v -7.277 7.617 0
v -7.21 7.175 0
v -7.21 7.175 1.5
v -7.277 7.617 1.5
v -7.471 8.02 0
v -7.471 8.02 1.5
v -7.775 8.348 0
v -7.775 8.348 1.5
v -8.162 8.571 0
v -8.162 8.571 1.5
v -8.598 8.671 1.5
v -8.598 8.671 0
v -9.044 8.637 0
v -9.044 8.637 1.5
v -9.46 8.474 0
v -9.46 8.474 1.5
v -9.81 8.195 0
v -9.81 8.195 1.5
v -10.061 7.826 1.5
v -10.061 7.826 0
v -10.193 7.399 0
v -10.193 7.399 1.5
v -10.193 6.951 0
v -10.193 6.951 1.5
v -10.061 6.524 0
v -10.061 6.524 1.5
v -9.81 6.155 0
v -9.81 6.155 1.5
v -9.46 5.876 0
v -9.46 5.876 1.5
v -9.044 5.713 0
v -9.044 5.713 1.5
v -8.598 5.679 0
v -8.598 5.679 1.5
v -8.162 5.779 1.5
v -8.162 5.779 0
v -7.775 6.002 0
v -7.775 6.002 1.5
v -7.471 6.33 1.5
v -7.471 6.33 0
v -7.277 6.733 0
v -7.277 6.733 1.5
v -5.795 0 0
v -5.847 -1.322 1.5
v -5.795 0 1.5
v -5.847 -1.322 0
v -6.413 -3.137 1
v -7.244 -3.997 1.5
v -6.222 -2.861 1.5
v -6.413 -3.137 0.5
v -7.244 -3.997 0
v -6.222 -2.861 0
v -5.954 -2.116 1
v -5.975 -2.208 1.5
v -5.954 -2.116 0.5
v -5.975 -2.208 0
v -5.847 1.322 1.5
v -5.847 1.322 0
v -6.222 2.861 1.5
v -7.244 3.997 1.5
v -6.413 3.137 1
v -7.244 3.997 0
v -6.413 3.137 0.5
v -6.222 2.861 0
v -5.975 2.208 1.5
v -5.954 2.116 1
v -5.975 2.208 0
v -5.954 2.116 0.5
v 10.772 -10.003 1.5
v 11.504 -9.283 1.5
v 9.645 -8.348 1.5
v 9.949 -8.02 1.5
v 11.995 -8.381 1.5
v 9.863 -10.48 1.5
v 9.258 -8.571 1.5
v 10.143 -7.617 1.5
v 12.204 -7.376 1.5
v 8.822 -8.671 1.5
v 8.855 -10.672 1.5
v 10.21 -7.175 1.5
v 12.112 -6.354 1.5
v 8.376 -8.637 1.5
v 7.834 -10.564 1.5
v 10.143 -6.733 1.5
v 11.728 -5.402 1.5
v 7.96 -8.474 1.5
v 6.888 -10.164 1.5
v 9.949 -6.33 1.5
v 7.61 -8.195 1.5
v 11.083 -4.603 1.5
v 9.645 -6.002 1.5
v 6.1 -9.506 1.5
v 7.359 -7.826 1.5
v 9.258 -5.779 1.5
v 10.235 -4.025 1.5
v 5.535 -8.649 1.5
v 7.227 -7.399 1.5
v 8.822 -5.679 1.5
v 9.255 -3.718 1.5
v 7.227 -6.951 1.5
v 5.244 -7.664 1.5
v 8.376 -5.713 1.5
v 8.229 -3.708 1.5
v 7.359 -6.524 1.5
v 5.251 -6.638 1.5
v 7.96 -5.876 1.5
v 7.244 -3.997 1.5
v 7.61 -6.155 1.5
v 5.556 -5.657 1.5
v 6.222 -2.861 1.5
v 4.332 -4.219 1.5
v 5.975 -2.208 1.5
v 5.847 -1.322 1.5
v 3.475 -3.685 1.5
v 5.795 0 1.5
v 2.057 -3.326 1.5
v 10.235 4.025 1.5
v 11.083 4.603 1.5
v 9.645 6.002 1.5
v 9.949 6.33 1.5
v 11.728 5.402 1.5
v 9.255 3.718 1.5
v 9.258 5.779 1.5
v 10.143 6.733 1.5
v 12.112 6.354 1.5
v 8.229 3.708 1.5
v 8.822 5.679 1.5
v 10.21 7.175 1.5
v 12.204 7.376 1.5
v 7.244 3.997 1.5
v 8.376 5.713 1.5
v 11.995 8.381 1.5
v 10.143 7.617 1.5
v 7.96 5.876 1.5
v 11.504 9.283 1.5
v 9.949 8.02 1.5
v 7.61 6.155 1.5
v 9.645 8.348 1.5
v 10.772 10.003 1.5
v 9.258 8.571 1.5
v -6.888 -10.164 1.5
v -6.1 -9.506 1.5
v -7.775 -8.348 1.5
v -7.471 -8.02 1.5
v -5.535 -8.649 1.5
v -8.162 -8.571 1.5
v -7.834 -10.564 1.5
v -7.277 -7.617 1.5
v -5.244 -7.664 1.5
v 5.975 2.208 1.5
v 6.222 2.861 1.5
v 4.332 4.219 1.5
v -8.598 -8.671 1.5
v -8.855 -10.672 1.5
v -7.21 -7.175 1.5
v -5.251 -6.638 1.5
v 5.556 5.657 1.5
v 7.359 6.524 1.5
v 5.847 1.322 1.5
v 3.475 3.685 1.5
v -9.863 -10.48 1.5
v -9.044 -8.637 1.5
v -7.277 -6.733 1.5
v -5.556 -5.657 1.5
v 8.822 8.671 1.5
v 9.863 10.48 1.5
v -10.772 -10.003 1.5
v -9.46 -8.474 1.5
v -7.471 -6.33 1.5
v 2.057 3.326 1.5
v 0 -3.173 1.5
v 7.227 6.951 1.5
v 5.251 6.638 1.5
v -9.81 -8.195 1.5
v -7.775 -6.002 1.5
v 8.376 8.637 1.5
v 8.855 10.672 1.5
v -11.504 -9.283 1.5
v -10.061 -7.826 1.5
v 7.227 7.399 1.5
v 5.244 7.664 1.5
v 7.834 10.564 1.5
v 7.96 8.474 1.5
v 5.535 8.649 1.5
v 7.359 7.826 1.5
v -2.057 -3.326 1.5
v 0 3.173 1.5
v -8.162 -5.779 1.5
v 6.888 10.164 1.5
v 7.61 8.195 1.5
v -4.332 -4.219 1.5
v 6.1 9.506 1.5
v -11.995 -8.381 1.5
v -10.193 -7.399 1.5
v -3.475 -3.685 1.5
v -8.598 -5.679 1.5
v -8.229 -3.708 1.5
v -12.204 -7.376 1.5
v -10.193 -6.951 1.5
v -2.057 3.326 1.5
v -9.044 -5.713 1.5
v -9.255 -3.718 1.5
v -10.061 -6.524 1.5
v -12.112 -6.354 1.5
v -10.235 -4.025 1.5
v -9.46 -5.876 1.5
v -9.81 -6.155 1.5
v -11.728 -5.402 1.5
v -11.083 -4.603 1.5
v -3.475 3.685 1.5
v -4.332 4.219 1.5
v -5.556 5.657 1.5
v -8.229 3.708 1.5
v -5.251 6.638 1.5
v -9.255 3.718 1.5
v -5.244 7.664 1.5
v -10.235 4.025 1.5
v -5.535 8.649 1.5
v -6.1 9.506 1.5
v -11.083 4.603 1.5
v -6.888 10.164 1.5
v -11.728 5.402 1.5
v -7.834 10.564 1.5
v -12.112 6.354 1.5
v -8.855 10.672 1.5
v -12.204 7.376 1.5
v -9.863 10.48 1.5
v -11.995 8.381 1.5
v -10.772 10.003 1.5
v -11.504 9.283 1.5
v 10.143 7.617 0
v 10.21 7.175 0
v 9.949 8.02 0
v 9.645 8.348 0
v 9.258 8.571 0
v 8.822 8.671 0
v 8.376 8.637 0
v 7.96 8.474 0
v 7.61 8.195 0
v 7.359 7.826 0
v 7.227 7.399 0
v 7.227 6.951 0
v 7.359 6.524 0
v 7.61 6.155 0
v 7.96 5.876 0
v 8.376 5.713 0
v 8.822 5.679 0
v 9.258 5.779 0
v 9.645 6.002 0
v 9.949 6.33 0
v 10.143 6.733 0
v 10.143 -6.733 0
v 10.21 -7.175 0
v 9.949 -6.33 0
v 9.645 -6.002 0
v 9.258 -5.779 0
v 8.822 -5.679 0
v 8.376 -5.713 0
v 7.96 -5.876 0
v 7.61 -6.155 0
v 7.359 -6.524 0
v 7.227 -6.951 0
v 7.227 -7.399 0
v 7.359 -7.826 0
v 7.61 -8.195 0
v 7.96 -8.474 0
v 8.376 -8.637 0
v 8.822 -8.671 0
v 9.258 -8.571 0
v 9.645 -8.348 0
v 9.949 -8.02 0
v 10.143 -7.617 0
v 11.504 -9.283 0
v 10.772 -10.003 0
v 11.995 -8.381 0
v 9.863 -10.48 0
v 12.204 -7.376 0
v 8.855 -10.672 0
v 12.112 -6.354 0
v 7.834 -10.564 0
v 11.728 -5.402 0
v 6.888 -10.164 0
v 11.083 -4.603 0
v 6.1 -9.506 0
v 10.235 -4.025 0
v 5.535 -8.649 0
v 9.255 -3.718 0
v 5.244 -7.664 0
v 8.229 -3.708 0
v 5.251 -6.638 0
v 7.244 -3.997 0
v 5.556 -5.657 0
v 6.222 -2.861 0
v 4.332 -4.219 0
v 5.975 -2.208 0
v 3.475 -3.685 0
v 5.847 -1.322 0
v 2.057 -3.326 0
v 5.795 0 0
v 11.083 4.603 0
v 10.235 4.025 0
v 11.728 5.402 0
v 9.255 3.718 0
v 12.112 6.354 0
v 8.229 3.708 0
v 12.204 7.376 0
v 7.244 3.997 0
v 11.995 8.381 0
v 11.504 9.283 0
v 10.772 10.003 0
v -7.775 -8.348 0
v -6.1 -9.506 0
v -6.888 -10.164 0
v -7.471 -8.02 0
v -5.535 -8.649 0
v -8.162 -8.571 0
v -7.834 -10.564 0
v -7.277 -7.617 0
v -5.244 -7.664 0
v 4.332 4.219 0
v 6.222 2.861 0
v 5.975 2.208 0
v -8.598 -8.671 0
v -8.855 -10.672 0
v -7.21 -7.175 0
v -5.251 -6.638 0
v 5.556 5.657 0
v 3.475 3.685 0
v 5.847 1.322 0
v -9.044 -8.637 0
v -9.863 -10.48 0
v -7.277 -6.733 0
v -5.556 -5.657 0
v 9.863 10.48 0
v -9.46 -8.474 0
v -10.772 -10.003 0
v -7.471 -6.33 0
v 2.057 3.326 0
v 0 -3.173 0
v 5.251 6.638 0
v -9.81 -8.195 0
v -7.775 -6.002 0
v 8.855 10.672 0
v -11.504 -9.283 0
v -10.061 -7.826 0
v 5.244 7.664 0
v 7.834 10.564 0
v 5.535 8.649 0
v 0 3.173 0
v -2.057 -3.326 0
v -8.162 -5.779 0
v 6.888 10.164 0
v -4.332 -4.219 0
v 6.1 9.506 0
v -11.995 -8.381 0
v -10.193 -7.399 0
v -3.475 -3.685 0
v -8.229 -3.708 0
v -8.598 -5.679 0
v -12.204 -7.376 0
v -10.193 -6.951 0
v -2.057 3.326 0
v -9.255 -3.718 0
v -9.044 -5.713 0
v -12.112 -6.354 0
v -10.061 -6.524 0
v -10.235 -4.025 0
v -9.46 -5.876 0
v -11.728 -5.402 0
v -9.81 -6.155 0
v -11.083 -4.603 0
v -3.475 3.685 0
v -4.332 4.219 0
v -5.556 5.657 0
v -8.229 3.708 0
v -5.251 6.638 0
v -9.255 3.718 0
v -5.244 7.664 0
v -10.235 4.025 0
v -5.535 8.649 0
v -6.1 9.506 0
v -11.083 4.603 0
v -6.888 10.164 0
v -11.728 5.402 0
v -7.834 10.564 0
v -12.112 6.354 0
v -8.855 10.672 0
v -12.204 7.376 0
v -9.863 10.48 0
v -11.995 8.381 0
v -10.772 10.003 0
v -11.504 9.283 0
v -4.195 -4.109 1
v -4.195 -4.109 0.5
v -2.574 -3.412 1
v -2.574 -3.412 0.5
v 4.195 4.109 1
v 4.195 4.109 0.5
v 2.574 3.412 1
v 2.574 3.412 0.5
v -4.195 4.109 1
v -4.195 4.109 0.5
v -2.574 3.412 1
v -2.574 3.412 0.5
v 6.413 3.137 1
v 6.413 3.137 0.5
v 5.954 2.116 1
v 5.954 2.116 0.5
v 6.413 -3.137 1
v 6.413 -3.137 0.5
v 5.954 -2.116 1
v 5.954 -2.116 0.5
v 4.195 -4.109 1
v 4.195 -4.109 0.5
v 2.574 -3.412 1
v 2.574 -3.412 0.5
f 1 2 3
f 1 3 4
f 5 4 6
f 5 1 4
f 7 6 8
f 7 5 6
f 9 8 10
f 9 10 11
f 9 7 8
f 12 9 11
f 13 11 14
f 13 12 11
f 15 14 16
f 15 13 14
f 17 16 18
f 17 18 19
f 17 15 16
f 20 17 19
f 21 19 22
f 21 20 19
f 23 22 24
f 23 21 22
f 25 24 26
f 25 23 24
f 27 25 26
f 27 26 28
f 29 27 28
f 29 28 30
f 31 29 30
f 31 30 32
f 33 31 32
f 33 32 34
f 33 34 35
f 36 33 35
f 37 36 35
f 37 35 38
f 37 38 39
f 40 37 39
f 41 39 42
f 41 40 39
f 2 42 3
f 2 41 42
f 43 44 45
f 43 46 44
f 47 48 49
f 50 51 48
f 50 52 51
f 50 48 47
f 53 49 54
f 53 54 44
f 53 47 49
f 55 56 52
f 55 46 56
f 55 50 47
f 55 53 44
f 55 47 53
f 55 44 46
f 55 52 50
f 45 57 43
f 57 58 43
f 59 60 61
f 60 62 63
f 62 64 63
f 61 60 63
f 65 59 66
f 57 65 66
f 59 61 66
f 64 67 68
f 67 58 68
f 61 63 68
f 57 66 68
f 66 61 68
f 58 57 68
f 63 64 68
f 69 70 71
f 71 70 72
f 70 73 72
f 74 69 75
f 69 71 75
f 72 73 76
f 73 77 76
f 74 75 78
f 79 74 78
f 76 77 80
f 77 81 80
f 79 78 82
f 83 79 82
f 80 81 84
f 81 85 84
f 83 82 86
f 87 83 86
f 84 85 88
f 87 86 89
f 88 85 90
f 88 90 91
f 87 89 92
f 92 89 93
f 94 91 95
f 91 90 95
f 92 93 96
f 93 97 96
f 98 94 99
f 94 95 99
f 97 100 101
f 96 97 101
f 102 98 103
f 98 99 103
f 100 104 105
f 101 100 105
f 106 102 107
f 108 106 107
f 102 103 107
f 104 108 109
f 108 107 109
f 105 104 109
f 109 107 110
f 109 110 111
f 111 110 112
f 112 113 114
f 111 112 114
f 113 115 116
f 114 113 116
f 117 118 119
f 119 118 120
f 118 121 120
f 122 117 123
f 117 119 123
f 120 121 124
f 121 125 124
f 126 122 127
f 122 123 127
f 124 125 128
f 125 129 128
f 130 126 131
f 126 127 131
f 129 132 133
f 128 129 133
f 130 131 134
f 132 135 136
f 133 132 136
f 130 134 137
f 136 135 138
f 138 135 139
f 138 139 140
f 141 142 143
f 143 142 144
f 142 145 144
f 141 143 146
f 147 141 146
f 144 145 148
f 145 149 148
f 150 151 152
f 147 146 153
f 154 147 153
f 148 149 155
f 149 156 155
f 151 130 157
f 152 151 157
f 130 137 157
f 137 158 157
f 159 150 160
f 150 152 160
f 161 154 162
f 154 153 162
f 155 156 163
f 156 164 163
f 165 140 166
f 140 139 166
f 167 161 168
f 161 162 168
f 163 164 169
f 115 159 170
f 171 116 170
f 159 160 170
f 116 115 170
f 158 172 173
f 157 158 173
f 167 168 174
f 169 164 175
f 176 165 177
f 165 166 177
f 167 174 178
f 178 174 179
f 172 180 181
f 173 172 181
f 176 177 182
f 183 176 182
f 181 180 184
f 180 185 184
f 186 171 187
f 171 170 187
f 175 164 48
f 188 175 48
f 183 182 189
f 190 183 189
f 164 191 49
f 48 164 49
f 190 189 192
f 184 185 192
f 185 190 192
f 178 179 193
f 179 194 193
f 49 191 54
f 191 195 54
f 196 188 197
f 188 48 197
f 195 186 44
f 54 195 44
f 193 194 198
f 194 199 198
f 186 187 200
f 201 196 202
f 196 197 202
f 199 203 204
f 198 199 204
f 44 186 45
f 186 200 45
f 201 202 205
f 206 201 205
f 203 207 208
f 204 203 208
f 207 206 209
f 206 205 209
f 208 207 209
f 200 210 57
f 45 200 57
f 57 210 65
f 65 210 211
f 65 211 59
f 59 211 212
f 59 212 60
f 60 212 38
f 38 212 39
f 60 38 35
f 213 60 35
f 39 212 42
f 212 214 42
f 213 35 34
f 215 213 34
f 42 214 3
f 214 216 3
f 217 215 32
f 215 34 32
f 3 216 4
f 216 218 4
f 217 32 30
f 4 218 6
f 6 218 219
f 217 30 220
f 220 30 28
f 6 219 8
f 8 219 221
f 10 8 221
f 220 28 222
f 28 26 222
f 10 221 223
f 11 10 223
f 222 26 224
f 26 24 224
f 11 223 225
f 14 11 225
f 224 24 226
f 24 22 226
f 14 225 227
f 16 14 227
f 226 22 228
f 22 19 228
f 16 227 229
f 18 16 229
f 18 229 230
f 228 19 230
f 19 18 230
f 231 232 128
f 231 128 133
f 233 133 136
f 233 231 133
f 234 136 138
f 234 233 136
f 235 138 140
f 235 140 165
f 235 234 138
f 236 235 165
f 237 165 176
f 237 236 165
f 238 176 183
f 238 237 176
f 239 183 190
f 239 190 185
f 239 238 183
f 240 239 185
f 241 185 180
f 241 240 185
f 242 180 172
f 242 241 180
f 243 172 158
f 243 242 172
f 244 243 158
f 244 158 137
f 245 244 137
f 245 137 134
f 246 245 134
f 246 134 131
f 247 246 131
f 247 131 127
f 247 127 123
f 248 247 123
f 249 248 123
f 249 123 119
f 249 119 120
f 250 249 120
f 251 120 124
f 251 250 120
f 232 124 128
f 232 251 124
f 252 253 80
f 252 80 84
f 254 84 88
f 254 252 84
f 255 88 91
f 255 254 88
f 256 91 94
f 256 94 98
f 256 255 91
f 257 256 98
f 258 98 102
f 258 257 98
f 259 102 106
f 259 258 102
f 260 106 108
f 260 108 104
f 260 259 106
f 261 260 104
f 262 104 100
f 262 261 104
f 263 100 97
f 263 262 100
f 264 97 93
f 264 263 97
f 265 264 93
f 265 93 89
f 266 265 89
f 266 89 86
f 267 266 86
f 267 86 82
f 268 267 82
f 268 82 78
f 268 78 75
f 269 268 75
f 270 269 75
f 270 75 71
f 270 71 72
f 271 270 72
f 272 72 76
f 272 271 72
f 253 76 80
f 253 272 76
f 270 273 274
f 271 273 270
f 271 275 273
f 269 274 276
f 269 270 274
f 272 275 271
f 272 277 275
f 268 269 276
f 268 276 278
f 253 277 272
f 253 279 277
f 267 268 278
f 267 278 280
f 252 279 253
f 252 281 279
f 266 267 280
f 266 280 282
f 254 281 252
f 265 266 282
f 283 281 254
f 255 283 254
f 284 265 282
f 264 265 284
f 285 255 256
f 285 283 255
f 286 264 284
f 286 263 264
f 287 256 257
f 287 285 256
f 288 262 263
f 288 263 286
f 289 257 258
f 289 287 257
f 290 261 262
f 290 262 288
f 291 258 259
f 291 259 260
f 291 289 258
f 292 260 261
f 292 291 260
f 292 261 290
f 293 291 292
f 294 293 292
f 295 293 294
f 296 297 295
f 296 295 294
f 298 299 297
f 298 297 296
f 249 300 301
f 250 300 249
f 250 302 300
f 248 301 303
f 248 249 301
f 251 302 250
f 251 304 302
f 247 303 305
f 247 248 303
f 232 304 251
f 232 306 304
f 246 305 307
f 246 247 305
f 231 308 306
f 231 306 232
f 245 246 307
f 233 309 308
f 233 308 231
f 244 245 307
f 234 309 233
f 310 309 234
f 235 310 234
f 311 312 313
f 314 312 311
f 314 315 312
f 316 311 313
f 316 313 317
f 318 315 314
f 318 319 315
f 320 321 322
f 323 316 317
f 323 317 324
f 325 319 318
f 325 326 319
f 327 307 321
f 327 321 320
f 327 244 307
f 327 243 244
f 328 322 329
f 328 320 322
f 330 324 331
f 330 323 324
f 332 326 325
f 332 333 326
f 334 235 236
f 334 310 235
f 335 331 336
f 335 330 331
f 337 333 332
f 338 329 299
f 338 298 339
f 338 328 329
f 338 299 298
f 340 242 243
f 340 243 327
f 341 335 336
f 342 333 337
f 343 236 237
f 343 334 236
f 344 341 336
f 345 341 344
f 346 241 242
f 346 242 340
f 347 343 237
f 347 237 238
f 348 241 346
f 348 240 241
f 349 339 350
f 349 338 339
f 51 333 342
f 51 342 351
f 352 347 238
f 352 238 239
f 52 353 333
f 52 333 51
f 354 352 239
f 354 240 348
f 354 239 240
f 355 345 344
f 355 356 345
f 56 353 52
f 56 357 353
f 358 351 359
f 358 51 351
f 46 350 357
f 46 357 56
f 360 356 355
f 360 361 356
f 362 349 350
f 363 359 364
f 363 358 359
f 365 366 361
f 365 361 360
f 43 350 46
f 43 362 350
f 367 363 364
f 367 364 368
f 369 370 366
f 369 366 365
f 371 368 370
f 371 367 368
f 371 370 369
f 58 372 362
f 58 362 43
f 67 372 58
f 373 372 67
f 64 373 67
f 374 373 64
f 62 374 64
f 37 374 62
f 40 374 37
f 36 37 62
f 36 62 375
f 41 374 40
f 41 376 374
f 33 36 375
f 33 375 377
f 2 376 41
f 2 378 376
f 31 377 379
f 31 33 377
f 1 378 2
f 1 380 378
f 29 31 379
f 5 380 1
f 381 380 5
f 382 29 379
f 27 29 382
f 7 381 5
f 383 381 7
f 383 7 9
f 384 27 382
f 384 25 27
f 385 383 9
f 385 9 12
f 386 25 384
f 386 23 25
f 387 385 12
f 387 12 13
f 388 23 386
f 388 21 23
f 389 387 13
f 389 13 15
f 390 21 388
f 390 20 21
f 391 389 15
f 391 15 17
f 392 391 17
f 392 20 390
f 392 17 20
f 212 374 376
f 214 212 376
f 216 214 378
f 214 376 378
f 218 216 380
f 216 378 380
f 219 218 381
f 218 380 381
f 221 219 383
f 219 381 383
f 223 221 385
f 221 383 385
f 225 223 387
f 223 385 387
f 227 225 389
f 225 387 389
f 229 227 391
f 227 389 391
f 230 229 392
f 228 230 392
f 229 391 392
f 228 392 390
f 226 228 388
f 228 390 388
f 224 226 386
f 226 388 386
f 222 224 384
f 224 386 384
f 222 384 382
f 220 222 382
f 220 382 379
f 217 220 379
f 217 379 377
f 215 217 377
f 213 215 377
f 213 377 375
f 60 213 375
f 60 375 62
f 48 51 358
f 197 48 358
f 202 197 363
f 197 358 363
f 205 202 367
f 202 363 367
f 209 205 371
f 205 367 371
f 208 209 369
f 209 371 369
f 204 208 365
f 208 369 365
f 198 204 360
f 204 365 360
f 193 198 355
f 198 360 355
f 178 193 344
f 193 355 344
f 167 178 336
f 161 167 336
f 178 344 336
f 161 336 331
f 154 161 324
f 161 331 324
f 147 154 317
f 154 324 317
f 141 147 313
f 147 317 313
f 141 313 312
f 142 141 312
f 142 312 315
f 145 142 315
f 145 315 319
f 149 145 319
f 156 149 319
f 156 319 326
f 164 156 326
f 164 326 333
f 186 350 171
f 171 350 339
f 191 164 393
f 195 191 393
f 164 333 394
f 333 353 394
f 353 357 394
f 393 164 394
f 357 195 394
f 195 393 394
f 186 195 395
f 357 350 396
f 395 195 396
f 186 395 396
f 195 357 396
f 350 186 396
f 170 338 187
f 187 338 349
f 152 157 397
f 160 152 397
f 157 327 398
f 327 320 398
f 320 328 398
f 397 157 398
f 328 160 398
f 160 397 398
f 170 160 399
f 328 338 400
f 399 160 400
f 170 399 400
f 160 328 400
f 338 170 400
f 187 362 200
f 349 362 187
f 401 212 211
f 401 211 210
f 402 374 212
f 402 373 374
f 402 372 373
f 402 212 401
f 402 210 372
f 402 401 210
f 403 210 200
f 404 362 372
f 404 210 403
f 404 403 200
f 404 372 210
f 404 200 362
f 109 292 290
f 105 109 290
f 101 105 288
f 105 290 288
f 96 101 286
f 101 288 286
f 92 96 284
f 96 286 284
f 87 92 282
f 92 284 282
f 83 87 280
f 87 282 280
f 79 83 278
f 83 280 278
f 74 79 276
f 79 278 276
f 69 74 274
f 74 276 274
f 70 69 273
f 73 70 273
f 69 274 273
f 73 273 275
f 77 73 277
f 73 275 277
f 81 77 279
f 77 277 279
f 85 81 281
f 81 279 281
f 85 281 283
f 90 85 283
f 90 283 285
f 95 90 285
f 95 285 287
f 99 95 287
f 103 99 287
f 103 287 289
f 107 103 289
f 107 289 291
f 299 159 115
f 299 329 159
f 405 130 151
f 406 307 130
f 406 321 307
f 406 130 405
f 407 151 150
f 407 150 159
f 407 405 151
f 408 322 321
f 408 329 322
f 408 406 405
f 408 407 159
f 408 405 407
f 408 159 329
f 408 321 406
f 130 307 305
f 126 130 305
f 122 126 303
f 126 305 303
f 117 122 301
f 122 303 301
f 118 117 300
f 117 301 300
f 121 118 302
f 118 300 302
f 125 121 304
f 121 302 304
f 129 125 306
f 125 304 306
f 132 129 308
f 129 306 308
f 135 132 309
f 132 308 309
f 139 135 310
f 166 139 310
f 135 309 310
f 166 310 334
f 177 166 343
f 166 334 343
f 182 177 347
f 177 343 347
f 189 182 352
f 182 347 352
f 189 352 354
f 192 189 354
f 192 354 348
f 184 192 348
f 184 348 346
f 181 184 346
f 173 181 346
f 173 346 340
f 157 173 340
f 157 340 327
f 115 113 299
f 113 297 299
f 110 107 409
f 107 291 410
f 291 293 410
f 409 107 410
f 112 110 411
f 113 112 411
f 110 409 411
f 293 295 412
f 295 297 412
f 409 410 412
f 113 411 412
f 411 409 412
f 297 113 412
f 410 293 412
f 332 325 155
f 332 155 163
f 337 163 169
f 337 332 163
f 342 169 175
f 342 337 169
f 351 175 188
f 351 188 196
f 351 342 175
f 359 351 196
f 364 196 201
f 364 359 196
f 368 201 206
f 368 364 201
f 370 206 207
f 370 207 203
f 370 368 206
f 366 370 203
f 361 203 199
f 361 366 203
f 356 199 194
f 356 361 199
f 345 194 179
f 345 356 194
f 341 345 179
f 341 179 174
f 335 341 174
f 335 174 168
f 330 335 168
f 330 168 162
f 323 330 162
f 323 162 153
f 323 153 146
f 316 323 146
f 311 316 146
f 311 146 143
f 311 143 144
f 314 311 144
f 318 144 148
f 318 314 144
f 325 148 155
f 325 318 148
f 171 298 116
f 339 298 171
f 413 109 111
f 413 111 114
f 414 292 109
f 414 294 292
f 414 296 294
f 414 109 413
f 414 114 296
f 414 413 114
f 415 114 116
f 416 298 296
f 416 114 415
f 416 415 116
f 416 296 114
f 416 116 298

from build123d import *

# Parameters (mm, degrees)
F0_R     = 1.5
F1_DEPTH = 1.5


with BuildPart() as f1:
    # F0 (on Top) → F1 (new body)
    with BuildSketch(Plane.XY):
        with BuildLine():
            add(Edge.make_bspline(
                [(-5.5561550838, 5.6573497621), (-4.0955413133, 3.5522743128), (-3.2797986642, 3.3143495675), (0, 3.173440462)],
                knots=[0, 0, 0, 0, 6.0861042323, 6.0861042323, 6.0861042323, 6.0861042323], degree=3))
            ThreePointArc((-5.5561550838, 5.6573497621), (-11.1647533144, 9.6698318912), (-7.2436210565, 3.9969923231))
            add(Edge.make_bspline(
                [(-7.2436210565, 3.9969923231), (-6.2028751709, 2.9064782429), (-5.828993395, 2.9744568747), (-5.7950043119, 0)],
                knots=[0, 0, 0, 0, 4.2514042508, 4.2514042508, 4.2514042508, 4.2514042508], degree=3))
            add(Edge.make_bspline(
                [(-7.2436210565, -3.9969923231), (-6.2028751709, -2.9064782429), (-5.828993395, -2.9744568747), (-5.7950043119, 0)],
                knots=[0, 0, 0, 0, 4.2514042508, 4.2514042508, 4.2514042508, 4.2514042508], degree=3))
            ThreePointArc((-7.2436210565, -3.9969923231), (-11.1647533144, -9.6698318912), (-5.5561550838, -5.6573497621))
            add(Edge.make_bspline(
                [(-5.5561550838, -5.6573497621), (-4.0955413133, -3.5522743128), (-3.2797986642, -3.3143495675), (0, -3.173440462)],
                knots=[0, 0, 0, 0, 6.0861042323, 6.0861042323, 6.0861042323, 6.0861042323], degree=3))
            add(Edge.make_bspline(
                [(5.5561550838, -5.6573497621), (4.0955413133, -3.5522743128), (3.2797986642, -3.3143495675), (0, -3.173440462)],
                knots=[0, 0, 0, 0, 6.0861042323, 6.0861042323, 6.0861042323, 6.0861042323], degree=3))
            ThreePointArc((5.5561550838, -5.6573497621), (11.1647533144, -9.6698318912), (7.2436210565, -3.9969923231))
            add(Edge.make_bspline(
                [(7.2436210565, -3.9969923231), (6.2028751709, -2.9064782429), (5.828993395, -2.9744568747), (5.7950043119, 0)],
                knots=[0, 0, 0, 0, 4.2514042508, 4.2514042508, 4.2514042508, 4.2514042508], degree=3))
            add(Edge.make_bspline(
                [(7.2436210565, 3.9969923231), (6.2028751709, 2.9064782429), (5.828993395, 2.9744568747), (5.7950043119, 0)],
                knots=[0, 0, 0, 0, 4.2514042508, 4.2514042508, 4.2514042508, 4.2514042508], degree=3))
            ThreePointArc((7.2436210565, 3.9969923231), (11.1647533144, 9.6698318912), (5.5561550838, 5.6573497621))
            add(Edge.make_bspline(
                [(5.5561550838, 5.6573497621), (4.0955413133, 3.5522743128), (3.2797986642, 3.3143495675), (0, 3.173440462)],
                knots=[0, 0, 0, 0, 6.0861042323, 6.0861042323, 6.0861042323, 6.0861042323], degree=3))
        make_face()
        with Locations((-8.71, -7.175)):
            Circle(F0_R, mode=Mode.SUBTRACT)
        with Locations((8.71, -7.175)):
            Circle(F0_R, mode=Mode.SUBTRACT)
        with Locations((-8.71, 7.175)):
            Circle(F0_R, mode=Mode.SUBTRACT)
        with Locations((8.71, 7.175)):
            Circle(F0_R, mode=Mode.SUBTRACT)
    extrude(amount=F1_DEPTH)


solid = f1.part
